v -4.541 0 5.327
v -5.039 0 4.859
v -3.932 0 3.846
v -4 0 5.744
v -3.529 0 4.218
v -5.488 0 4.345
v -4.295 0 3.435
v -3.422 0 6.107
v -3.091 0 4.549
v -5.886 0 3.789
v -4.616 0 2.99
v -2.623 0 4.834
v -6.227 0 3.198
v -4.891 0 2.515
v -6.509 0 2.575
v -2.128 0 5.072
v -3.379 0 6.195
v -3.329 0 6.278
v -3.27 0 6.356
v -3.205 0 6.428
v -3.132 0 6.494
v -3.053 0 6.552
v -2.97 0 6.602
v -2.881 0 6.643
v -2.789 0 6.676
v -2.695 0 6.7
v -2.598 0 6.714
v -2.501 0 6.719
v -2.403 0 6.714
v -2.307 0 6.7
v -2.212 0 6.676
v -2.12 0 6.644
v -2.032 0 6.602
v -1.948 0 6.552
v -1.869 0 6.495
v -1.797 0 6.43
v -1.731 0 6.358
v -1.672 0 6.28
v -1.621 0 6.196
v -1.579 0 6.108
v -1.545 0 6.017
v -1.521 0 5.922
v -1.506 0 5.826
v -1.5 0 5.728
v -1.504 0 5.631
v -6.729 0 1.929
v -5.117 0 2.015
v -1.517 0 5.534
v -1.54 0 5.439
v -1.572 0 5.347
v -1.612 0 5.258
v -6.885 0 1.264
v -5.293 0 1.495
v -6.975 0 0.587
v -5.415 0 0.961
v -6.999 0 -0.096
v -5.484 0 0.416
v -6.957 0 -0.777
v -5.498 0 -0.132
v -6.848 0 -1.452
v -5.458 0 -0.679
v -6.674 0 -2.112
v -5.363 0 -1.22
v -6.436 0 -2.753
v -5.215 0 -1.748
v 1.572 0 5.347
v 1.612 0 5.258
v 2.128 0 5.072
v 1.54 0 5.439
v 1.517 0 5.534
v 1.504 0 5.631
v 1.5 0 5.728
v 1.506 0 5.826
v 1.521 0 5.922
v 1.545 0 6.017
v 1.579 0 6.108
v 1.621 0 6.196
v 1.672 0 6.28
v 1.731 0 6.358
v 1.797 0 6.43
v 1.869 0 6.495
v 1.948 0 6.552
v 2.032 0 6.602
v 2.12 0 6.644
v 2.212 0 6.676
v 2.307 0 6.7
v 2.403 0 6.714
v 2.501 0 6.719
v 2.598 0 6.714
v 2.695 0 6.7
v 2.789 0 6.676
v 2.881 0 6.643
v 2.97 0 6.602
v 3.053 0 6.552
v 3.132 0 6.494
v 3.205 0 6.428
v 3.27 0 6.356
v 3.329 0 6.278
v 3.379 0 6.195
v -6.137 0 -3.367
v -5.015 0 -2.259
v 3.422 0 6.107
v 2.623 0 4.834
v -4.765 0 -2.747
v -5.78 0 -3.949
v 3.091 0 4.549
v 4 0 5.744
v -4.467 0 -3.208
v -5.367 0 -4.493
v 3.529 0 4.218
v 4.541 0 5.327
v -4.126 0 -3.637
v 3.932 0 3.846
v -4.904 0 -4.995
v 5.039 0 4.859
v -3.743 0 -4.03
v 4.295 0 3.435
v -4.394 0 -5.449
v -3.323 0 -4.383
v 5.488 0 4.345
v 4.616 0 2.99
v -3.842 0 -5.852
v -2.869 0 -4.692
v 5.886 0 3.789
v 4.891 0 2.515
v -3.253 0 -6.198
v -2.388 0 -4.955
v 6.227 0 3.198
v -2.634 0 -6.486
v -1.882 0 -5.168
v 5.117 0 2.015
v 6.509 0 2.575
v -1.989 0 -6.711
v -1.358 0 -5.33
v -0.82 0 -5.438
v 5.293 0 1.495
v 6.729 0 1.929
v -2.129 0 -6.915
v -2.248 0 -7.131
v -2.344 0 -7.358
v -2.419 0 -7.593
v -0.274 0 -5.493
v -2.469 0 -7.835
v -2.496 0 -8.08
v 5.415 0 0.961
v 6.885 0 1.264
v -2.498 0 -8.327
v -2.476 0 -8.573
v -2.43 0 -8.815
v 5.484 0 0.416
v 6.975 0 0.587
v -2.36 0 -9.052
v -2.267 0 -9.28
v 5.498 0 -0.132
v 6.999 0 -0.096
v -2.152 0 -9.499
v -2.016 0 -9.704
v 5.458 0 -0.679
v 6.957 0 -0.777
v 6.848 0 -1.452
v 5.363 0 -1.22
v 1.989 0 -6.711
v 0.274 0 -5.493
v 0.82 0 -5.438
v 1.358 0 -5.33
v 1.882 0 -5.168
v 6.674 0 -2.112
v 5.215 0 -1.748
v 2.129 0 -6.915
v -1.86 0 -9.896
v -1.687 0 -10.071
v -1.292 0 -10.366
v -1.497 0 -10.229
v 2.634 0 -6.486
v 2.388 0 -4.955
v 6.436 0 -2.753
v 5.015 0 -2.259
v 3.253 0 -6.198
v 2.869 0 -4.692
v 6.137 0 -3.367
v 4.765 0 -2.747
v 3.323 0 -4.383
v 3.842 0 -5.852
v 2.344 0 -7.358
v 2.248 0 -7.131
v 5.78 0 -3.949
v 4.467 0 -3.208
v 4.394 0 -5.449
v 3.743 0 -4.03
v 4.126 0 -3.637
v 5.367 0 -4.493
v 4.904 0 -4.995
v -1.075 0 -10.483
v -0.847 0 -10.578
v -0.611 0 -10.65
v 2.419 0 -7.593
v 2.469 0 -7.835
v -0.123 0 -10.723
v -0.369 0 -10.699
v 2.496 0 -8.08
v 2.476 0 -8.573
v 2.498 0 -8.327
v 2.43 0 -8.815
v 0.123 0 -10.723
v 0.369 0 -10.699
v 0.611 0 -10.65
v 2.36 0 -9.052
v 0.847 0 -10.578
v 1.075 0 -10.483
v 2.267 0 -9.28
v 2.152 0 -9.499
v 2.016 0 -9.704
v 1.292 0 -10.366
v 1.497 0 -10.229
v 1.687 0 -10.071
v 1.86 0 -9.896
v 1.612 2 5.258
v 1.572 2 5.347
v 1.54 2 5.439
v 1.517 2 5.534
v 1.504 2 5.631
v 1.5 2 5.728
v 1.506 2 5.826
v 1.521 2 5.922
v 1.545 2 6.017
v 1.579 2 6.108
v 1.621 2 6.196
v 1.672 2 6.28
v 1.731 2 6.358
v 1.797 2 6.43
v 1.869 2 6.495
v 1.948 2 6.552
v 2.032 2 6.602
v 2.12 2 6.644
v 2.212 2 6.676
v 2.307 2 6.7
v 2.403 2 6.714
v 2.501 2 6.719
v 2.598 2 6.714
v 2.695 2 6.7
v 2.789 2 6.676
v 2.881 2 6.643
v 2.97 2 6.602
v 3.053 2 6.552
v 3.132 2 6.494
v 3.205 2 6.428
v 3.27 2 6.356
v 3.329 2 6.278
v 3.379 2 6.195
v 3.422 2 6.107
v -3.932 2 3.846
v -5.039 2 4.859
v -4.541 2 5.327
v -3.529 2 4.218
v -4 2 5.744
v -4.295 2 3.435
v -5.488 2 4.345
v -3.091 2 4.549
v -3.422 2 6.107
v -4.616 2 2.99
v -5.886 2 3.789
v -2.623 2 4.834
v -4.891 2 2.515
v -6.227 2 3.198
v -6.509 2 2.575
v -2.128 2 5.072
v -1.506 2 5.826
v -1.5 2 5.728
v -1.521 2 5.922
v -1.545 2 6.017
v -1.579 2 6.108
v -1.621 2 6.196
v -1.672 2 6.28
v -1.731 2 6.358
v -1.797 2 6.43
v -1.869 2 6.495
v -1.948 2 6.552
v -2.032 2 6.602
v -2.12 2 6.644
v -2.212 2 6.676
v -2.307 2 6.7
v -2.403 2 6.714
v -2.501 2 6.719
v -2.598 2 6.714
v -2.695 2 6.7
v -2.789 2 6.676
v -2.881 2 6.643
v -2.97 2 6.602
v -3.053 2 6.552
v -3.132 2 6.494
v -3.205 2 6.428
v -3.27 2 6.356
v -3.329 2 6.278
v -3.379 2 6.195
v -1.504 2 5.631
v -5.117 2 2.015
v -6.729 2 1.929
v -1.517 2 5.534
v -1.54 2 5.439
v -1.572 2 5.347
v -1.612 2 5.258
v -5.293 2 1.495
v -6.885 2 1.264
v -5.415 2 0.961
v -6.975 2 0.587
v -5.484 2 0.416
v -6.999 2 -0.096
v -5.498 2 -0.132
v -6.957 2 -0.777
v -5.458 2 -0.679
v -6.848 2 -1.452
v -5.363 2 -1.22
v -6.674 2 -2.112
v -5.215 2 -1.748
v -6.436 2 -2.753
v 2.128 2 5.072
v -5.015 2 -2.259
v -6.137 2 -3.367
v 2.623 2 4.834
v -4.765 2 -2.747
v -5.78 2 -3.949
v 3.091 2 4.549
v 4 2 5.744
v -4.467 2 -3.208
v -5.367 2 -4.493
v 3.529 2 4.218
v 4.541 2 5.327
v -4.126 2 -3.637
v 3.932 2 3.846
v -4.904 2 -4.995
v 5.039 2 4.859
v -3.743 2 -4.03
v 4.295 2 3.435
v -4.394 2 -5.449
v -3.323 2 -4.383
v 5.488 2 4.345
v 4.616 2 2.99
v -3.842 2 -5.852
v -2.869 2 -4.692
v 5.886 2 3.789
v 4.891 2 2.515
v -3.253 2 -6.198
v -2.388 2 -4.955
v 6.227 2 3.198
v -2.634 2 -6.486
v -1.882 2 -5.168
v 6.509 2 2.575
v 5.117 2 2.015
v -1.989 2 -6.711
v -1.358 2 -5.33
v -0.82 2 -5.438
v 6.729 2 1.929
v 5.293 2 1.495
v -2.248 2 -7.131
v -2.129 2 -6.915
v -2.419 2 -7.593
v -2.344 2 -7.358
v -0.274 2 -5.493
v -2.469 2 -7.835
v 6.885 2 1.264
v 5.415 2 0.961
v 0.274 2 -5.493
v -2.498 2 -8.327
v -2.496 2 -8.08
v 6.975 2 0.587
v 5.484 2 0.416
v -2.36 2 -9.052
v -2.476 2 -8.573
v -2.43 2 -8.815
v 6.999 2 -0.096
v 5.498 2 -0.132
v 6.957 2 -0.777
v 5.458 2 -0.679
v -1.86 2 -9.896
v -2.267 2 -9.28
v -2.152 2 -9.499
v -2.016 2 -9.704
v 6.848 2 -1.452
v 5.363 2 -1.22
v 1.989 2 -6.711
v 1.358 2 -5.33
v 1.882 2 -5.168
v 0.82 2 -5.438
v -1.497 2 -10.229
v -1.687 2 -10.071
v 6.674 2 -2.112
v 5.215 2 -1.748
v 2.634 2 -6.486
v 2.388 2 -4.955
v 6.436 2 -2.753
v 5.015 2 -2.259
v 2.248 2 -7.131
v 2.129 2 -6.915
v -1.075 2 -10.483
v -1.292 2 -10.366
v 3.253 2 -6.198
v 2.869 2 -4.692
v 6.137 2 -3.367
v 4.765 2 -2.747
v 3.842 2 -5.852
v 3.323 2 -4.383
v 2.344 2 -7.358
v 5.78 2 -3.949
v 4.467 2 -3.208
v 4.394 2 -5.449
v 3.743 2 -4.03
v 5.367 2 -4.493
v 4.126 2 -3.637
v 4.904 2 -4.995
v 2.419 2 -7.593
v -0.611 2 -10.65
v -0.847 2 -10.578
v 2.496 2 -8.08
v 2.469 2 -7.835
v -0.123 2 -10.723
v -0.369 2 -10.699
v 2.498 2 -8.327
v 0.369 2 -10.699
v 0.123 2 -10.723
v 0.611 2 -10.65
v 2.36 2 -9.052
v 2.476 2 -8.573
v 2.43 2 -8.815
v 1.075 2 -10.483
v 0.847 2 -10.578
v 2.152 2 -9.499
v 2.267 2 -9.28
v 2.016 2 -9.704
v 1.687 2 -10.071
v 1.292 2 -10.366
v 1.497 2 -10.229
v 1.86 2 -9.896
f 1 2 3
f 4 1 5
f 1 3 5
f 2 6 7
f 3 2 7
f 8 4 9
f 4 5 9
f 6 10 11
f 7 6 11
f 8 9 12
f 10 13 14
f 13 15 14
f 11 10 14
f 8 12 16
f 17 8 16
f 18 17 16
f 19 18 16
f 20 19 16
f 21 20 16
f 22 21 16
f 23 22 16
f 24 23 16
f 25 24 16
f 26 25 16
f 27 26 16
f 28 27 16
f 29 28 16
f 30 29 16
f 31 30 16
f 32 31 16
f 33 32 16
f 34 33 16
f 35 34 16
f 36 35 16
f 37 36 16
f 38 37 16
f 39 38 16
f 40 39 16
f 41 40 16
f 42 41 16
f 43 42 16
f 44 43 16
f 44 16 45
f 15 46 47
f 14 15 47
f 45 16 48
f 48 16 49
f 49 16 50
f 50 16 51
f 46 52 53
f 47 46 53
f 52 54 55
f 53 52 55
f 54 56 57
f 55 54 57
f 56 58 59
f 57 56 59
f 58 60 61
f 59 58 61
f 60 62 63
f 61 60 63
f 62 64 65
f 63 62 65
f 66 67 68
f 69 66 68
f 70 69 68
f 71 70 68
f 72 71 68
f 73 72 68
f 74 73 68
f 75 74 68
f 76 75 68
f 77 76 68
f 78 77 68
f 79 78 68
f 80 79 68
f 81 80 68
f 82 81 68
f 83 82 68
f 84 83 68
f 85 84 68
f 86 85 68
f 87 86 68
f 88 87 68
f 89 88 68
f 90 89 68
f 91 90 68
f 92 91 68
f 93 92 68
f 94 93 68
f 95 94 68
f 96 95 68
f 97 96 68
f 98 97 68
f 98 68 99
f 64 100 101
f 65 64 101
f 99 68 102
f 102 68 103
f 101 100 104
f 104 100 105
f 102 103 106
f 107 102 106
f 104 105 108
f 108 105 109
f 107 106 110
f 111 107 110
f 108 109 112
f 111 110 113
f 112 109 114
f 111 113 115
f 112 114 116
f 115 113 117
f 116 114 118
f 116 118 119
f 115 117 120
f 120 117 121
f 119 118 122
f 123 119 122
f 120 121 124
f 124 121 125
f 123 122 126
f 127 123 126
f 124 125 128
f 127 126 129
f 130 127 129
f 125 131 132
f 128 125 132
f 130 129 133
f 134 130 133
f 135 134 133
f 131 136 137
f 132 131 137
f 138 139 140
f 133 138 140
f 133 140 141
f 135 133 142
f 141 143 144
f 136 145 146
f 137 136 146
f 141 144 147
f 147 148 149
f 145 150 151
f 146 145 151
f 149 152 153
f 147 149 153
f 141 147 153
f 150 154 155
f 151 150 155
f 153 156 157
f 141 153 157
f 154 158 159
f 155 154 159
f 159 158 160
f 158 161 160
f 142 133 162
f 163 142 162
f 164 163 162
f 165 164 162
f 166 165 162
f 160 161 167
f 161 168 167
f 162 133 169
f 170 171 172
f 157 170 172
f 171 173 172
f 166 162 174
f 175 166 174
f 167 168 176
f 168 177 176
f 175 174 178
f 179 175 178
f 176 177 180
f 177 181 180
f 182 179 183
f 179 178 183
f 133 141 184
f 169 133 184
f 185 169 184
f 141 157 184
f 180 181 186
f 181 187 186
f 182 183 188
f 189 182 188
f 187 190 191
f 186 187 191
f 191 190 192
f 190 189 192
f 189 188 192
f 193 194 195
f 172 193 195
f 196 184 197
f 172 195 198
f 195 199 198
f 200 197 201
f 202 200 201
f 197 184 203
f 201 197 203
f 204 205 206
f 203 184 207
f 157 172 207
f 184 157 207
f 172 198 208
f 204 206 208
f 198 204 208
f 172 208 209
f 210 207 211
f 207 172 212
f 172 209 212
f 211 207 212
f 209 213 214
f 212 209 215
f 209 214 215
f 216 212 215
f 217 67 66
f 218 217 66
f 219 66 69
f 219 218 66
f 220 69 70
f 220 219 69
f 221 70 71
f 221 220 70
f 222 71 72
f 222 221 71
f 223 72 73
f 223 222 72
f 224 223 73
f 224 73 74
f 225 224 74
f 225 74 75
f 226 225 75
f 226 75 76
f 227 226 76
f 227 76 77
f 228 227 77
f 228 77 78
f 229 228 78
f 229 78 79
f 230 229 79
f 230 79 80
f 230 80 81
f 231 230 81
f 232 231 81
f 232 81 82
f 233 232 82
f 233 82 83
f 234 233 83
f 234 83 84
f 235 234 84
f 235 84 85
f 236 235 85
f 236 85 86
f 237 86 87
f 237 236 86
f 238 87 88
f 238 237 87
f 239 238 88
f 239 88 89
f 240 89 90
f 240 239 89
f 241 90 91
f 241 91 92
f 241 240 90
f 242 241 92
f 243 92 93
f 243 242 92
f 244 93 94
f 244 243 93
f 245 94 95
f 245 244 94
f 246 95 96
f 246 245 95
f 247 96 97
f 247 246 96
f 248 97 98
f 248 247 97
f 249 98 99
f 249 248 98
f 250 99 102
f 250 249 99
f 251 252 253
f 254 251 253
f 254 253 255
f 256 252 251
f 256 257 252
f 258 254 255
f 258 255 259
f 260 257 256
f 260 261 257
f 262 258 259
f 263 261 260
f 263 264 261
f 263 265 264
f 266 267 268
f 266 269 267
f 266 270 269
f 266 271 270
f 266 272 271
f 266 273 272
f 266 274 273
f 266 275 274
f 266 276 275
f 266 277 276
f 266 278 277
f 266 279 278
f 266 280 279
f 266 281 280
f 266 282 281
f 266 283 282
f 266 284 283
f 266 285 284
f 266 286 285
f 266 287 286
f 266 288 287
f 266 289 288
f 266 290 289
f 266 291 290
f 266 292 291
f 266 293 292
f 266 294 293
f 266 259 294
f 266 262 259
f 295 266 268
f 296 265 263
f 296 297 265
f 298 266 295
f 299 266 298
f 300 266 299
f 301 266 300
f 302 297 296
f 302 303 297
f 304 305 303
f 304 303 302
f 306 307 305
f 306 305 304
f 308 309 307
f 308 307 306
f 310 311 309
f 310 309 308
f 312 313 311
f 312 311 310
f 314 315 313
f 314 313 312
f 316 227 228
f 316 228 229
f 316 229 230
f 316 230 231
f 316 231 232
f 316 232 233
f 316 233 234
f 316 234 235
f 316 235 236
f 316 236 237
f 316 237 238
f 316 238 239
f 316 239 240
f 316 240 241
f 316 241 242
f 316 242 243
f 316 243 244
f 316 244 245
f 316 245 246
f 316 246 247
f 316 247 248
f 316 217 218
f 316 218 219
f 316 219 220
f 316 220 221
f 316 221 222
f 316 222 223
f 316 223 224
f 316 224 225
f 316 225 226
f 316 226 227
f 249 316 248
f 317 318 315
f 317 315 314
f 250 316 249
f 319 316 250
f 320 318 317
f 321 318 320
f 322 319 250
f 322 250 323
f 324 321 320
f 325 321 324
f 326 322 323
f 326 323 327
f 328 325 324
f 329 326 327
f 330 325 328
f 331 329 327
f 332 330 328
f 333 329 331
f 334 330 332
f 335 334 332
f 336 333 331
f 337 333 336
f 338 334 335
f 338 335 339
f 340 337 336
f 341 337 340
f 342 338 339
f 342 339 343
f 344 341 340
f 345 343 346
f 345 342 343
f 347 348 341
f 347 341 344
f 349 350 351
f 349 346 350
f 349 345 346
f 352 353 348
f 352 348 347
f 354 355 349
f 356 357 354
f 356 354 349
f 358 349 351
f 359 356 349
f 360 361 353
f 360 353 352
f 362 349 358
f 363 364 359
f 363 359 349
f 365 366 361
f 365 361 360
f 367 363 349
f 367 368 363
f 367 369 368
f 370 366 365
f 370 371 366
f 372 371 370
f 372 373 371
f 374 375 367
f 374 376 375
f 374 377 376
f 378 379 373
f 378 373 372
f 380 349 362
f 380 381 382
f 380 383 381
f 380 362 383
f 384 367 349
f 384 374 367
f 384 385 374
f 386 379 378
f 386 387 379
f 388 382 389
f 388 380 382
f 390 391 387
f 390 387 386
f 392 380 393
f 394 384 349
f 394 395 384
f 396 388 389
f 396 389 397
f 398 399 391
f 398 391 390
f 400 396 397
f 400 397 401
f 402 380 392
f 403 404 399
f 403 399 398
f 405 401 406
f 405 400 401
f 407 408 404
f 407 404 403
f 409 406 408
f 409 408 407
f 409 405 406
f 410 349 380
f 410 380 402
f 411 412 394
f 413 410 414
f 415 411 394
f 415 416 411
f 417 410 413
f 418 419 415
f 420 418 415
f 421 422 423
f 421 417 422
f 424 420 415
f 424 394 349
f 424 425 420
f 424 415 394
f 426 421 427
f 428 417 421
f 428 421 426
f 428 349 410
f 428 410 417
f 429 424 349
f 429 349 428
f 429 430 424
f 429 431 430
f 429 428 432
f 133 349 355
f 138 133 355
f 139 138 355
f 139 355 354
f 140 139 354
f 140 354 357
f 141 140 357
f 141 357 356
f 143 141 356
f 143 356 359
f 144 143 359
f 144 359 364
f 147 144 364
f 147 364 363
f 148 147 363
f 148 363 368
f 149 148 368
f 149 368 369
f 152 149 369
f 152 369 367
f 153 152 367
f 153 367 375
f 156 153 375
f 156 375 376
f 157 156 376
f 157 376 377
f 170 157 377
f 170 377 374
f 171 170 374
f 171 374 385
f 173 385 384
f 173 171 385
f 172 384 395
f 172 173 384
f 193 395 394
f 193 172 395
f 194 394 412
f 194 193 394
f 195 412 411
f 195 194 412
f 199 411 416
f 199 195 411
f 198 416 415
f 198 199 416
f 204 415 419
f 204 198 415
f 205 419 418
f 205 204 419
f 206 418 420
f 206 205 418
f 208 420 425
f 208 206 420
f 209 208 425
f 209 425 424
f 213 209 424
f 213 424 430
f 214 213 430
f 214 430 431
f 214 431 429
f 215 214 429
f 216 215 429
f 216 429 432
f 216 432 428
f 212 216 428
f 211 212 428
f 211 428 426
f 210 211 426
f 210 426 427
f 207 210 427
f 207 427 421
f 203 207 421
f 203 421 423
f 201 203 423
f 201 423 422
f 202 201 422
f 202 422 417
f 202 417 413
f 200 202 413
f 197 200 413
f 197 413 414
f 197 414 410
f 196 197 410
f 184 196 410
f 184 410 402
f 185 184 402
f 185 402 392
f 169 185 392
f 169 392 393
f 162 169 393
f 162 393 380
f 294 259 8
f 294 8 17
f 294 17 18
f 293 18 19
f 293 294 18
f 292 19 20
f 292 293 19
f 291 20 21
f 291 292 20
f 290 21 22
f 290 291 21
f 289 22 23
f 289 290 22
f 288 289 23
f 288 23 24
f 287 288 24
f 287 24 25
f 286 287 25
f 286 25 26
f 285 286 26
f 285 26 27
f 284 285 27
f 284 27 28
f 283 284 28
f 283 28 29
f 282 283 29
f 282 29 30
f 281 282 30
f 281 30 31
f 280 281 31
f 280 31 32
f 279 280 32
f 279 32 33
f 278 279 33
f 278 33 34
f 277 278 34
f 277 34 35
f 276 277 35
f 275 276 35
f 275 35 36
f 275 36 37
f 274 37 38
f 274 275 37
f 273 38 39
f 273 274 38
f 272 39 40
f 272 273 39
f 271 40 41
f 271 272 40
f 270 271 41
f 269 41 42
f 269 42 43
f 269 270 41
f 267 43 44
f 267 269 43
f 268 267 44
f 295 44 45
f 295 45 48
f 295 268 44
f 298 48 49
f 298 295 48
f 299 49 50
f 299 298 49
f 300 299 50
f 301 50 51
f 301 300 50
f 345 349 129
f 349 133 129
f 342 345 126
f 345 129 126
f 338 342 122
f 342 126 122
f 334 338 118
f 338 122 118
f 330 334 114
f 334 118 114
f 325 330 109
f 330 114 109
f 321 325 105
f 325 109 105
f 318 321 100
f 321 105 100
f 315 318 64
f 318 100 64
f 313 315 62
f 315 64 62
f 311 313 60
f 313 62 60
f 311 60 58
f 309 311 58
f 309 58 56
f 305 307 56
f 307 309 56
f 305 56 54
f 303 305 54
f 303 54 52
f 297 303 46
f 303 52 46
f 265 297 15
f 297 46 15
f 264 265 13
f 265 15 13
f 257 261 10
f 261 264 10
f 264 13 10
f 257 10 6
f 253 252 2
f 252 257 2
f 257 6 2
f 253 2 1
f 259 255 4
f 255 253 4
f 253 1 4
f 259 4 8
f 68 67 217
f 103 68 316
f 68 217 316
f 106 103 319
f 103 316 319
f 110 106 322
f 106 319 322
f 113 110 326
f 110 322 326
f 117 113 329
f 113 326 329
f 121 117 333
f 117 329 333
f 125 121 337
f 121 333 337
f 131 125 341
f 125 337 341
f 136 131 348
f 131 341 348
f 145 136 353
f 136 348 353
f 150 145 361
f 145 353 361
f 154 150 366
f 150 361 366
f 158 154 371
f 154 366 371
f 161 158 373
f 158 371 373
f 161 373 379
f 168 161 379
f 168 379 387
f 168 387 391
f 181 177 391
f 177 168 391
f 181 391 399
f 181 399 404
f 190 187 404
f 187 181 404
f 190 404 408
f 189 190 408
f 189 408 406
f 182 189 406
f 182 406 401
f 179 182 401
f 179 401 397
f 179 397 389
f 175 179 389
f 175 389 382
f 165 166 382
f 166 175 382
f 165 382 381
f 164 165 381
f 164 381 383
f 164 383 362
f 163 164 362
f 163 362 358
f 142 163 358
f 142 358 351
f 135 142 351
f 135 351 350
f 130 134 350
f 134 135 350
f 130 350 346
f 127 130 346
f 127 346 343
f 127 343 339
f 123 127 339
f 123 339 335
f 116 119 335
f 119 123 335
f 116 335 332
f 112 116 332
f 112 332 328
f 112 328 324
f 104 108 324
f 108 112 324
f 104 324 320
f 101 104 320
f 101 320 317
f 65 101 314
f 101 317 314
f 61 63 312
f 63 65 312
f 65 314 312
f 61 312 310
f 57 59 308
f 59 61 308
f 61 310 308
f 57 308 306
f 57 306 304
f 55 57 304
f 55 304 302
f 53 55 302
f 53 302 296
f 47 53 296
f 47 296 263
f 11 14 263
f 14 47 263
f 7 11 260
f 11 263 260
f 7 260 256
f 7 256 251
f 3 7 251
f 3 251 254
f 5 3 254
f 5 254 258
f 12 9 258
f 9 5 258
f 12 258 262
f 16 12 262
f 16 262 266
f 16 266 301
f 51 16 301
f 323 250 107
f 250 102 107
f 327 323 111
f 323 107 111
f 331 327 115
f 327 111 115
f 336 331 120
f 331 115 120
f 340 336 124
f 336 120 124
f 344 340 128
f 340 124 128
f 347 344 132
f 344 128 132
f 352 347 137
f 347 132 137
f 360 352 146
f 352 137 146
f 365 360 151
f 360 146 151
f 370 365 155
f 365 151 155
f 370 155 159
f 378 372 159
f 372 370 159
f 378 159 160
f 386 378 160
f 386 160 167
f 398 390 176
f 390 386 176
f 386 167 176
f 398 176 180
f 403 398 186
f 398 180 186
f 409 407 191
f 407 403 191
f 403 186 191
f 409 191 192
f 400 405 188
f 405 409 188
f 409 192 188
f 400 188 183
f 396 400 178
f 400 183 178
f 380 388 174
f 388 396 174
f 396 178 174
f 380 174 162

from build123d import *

# Parameters (mm, degrees)
SKETCH1_R           = 7
BOSS_EXTRUDE1_DEPTH = 2
SKETCH2_R           = 5.5
CUT_EXTRUDE1_DEPTH  = 2
SKETCH3_R           = 2.5
BOSS_EXTRUDE4_DEPTH = 2
SKETCH4_W           = 5
SKETCH4_H           = 5.341067824
CUT_EXTRUDE4_DEPTH  = 2
SKETCH6_R           = 1
BOSS_EXTRUDE6_DEPTH = 2
SKETCH8_R           = 1
BOSS_EXTRUDE7_DEPTH = 2
SKETCH9_R           = 5.5
CUT_EXTRUDE5_DEPTH  = 2


with BuildPart() as part:
    # Sketch1 → Boss-Extrude1 (new body)
    with BuildSketch(Plane(origin=(0, 0, 0), x_dir=(1, 0, 0), z_dir=(0, 1, 0))):
        with Locations(Location((0, 0, 0), (0, 0, 270))):
            Circle(SKETCH1_R)
    extrude(amount=BOSS_EXTRUDE1_DEPTH)

    # Sketch2 → Cut-Extrude1 (cut)
    with BuildSketch(Plane(origin=(0, 2, 0), x_dir=(1, 0, 0), z_dir=(0, 1, 0))):
        with Locations(Location((0, 0, 0), (0, 0, 270))):
            Circle(SKETCH2_R)
    extrude(amount=-CUT_EXTRUDE1_DEPTH, mode=Mode.SUBTRACT)

    # Sketch3 → Boss-Extrude4 (add)
    with BuildSketch(Plane.XZ):
        with Locations((0, -8.225966767)):
            Circle(SKETCH3_R)
    extrude(amount=-BOSS_EXTRUDE4_DEPTH)

    # Sketch4 → Cut-Extrude4 (cut)
    with BuildSketch(Plane(origin=(0, 2, 0), x_dir=(1, 0, 0), z_dir=(0, 1, 0))):
        with Locations((0, -7)):
            Rectangle(SKETCH4_W, SKETCH4_H)
    extrude(amount=-CUT_EXTRUDE4_DEPTH, mode=Mode.SUBTRACT)

    # Sketch6 → Boss-Extrude6 (add)
    with BuildSketch(Plane(origin=(0, 2, 0), x_dir=(1, 0, 0), z_dir=(0, 1, 0))):
        with Locations((2.5, -5.71866395)):
            Circle(SKETCH6_R)
    extrude(amount=-BOSS_EXTRUDE6_DEPTH)

    # Sketch8 → Boss-Extrude7 (add)
    with BuildSketch(Plane(origin=(0, 2, 0), x_dir=(1, 0, 0), z_dir=(0, 1, 0))):
        with Locations((-2.5, -5.71866395)):
            Circle(SKETCH8_R)
    extrude(amount=-BOSS_EXTRUDE7_DEPTH)

    # Sketch9 → Cut-Extrude5 (cut)
    with BuildSketch(Plane(origin=(0, 2, 0), x_dir=(1, 0, 0), z_dir=(0, 1, 0))):
        Circle(SKETCH9_R)
    extrude(amount=-CUT_EXTRUDE5_DEPTH, mode=Mode.SUBTRACT)


solid = part.part
